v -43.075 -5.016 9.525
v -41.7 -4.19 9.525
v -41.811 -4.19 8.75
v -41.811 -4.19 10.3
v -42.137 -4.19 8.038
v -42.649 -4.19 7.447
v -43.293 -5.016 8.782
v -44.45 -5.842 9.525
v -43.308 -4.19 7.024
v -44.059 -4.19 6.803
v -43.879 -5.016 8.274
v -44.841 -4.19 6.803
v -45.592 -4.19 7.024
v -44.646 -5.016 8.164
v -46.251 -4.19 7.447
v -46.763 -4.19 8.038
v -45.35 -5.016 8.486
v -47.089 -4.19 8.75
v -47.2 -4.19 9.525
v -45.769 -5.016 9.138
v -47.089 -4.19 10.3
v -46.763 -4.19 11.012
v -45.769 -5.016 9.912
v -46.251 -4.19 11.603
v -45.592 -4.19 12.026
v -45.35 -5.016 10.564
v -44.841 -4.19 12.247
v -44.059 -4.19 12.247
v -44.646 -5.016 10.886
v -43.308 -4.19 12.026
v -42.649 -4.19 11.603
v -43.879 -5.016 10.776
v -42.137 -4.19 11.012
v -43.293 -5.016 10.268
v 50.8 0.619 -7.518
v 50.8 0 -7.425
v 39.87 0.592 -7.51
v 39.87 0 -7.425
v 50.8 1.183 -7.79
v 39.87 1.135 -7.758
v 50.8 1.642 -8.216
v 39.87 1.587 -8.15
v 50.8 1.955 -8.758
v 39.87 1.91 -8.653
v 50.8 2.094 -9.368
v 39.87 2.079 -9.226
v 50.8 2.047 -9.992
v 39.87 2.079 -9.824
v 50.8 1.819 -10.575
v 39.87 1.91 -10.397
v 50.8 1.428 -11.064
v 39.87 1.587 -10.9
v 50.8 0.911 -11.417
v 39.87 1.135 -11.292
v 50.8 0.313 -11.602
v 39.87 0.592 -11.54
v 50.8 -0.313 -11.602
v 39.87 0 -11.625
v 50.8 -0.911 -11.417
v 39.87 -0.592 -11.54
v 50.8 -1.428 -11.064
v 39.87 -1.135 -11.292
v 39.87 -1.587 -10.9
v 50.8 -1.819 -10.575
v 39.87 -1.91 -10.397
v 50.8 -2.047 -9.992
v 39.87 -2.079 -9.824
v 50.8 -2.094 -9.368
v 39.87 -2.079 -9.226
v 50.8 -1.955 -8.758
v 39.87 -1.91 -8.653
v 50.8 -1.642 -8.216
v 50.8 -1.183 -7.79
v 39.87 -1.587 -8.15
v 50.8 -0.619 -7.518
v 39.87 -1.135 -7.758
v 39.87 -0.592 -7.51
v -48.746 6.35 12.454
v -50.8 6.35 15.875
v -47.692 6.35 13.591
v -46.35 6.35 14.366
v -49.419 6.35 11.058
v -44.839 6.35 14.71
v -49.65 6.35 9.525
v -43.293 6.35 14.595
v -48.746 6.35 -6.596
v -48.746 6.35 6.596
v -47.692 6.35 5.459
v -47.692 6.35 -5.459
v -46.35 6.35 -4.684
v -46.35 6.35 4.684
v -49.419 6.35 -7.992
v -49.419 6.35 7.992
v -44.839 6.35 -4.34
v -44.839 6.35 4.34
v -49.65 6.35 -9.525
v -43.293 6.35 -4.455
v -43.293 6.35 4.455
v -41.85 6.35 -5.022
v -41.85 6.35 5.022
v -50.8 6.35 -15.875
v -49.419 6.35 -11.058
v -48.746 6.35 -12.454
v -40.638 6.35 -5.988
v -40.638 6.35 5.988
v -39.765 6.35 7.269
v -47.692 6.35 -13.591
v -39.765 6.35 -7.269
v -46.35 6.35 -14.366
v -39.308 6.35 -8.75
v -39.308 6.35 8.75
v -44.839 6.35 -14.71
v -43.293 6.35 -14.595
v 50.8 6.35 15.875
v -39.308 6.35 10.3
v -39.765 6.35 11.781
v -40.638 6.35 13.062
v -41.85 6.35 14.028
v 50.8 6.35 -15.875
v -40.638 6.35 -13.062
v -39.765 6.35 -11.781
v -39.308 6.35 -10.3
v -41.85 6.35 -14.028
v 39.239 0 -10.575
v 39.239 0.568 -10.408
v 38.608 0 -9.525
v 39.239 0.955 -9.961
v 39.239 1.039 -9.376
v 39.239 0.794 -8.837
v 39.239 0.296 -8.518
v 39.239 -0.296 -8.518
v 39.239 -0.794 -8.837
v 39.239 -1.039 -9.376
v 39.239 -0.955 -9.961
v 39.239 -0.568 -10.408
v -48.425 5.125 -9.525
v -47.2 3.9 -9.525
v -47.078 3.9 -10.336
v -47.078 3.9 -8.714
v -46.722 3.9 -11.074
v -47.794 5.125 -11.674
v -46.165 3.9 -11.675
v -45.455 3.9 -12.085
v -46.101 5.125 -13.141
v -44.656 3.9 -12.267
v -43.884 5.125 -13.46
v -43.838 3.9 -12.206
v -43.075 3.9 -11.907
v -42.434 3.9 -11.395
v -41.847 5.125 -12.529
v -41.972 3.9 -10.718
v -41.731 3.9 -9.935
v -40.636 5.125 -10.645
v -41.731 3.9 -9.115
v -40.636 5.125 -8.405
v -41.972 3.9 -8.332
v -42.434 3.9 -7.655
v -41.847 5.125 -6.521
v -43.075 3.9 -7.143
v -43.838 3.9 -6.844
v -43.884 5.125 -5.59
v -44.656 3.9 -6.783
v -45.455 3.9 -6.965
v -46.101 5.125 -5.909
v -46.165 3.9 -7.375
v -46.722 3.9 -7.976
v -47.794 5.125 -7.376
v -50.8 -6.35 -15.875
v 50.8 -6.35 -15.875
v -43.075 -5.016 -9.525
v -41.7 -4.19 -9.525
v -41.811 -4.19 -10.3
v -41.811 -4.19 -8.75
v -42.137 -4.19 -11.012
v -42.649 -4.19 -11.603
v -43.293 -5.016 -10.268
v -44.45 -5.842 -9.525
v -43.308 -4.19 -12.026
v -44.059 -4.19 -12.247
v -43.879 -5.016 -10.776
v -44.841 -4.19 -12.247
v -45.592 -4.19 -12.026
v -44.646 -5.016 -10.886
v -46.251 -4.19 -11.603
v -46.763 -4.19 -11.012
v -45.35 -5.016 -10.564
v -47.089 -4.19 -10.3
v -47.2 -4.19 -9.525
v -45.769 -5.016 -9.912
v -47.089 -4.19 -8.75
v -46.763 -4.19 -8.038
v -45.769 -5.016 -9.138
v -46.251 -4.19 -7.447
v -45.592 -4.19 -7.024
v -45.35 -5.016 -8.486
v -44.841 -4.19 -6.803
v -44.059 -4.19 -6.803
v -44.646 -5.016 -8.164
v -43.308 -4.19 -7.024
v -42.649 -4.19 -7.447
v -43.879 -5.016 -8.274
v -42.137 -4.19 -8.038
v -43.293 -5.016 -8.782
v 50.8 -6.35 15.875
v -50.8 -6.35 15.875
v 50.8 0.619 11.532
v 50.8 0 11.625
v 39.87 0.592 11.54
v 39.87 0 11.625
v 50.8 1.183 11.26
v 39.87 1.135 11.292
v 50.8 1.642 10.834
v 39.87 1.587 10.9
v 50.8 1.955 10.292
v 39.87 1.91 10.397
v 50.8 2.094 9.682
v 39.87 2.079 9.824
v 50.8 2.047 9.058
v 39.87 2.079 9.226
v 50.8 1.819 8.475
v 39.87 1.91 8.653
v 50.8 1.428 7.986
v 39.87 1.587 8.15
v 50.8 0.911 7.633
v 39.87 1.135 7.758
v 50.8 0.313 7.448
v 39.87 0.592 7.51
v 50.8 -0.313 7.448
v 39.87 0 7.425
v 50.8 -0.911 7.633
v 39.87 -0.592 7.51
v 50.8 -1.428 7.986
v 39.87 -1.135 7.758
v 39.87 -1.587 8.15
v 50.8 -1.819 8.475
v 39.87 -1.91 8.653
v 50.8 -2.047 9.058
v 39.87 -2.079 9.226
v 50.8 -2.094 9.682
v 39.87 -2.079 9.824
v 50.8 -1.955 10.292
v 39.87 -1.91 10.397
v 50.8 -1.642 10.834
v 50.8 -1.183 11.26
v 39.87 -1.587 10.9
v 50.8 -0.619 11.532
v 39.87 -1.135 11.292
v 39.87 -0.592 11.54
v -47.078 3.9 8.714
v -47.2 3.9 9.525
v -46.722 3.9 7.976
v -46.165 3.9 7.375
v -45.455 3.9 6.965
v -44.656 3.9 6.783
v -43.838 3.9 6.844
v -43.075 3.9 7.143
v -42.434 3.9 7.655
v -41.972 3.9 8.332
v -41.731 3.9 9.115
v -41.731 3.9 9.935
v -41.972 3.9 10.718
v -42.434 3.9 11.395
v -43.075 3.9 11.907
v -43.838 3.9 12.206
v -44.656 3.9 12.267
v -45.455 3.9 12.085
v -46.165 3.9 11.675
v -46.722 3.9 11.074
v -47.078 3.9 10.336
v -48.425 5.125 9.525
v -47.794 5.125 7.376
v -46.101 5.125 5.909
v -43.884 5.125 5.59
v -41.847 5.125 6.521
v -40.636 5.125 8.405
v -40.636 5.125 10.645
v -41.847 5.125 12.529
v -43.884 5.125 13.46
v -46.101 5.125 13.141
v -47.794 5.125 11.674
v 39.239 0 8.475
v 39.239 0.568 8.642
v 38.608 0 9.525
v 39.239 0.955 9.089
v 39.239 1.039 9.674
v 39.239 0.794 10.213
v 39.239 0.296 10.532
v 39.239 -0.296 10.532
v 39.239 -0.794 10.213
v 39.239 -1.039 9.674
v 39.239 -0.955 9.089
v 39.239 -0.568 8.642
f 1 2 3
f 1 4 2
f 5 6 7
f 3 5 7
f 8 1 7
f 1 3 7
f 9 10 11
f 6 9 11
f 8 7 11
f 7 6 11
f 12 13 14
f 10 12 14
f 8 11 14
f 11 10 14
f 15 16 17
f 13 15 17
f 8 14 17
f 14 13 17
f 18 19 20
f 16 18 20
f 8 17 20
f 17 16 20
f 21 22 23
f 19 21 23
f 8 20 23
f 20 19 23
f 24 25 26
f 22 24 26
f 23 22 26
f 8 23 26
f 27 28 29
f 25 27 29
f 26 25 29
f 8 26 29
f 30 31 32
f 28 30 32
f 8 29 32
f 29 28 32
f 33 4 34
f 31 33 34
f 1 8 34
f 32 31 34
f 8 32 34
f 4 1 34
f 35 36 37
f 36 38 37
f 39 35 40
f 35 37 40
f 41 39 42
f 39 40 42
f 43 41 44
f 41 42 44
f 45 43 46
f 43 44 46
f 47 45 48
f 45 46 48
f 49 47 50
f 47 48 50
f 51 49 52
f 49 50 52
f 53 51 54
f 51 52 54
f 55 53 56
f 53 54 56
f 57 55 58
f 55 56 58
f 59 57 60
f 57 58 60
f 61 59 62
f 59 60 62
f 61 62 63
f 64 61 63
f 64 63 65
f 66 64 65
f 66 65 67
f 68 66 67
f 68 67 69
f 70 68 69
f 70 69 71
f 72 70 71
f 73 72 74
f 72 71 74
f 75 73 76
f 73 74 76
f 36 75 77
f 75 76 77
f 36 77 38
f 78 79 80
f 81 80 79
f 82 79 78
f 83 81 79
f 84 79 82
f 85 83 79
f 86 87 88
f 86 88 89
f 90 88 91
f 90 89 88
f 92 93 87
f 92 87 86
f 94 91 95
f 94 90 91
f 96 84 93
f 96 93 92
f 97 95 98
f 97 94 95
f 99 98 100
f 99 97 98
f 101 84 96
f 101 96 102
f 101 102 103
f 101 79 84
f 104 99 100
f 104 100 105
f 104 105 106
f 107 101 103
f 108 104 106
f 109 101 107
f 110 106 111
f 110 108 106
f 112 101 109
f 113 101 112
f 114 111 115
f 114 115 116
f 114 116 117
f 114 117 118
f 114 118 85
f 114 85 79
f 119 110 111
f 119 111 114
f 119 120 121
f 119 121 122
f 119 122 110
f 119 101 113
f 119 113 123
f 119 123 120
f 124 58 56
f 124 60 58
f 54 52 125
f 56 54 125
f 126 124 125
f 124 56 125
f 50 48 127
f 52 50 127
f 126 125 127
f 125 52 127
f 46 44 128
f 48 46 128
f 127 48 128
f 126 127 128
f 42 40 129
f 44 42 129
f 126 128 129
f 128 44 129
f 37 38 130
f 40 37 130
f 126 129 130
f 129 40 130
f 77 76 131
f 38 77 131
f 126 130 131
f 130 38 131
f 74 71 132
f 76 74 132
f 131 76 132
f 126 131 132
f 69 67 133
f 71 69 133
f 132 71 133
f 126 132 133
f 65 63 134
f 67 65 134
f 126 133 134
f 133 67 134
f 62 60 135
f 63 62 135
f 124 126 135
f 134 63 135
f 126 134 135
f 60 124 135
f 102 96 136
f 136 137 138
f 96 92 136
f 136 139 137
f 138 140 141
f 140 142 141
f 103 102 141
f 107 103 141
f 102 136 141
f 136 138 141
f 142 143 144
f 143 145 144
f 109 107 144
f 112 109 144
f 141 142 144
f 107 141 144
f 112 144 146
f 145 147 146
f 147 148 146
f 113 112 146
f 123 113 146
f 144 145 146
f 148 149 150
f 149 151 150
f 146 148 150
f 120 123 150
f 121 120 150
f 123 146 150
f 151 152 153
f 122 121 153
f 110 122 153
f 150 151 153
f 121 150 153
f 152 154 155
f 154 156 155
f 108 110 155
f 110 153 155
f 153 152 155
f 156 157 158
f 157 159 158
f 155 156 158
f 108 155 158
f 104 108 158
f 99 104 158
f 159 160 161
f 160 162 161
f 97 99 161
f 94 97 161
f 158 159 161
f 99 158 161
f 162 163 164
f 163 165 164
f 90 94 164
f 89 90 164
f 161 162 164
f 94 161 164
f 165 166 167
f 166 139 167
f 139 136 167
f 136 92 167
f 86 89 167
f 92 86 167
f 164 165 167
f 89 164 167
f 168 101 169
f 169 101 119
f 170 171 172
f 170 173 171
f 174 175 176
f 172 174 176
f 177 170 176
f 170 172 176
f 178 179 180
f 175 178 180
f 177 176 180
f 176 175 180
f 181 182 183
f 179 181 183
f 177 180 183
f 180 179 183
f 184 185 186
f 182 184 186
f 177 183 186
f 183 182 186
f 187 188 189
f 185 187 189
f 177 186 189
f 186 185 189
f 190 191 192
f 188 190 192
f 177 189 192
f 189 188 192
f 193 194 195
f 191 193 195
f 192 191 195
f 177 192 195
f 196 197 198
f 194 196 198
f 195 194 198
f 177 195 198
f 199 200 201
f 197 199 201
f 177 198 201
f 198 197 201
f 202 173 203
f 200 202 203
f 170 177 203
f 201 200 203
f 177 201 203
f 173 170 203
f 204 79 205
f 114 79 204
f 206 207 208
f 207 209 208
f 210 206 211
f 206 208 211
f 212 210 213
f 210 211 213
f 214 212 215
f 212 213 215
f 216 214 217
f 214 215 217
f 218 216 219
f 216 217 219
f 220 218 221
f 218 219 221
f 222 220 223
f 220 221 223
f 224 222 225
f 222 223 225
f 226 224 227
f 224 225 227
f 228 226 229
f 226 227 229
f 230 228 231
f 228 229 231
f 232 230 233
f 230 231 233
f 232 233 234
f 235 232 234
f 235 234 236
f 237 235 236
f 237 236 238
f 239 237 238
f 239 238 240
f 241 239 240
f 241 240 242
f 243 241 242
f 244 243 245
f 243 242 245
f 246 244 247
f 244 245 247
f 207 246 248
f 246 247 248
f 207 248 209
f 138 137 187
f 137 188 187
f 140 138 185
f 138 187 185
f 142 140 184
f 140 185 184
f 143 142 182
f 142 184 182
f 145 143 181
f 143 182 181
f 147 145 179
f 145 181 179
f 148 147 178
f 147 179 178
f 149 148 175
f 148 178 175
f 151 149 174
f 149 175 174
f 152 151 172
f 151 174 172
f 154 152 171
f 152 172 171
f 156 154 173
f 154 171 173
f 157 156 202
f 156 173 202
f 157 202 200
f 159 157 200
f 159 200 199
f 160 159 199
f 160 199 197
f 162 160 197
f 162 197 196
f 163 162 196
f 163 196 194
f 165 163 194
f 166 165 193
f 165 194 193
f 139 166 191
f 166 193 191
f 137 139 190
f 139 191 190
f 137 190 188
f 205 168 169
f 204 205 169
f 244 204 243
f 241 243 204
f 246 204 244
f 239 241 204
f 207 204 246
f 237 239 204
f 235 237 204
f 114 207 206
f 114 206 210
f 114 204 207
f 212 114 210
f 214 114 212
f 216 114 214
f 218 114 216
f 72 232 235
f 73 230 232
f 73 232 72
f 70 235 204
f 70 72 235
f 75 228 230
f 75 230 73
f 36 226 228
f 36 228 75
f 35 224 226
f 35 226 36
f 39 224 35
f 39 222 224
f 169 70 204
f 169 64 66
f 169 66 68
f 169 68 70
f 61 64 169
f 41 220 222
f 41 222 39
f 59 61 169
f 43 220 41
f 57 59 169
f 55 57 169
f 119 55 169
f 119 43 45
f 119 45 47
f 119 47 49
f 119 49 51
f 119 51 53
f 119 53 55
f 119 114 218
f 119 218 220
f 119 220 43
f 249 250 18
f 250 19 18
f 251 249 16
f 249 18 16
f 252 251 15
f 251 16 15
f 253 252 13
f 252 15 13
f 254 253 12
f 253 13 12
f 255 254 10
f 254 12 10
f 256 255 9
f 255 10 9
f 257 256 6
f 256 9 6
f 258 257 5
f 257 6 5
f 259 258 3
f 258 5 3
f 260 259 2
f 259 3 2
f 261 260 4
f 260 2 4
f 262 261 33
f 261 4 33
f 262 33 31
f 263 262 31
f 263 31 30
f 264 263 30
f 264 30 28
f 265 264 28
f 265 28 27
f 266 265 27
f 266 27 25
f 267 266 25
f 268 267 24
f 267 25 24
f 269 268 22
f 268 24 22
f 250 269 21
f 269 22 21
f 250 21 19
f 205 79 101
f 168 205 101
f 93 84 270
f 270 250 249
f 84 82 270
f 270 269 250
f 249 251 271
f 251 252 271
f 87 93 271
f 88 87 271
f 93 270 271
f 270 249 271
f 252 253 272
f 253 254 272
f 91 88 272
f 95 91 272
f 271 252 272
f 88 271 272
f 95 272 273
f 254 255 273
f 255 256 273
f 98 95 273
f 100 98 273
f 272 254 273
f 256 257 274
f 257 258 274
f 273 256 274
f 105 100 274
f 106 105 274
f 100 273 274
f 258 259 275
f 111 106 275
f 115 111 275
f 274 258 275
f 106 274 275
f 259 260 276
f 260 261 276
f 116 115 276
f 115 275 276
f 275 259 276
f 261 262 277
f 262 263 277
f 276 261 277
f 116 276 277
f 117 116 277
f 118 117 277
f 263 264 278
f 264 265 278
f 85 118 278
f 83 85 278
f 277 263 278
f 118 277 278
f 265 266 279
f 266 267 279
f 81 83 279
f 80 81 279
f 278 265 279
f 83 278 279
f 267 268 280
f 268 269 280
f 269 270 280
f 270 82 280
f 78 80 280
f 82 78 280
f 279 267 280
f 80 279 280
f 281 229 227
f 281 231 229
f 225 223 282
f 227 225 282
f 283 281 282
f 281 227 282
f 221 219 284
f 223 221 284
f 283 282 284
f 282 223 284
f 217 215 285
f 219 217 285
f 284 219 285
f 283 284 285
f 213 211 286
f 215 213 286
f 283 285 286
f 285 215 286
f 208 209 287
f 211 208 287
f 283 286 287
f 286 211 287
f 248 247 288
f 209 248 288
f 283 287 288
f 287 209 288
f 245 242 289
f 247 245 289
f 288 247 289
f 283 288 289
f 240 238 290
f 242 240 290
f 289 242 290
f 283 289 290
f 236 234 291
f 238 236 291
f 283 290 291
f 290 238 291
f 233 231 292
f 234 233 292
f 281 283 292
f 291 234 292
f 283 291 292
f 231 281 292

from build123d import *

# Parameters (mm, degrees)
SKETCH1_W                                       = 101.6
SKETCH1_H                                       = 31.75
BOSS_EXTRUDE1_DEPTH                             = 6.35
M5X0_8_TAPPED_HOLE1_D                           = 4.2
M5X0_8_TAPPED_HOLE1_DEPTH                       = 10.9301927
M5X0_8_TAPPED_HOLE1_TIP                         = 1.2618073
CSK_FOR_M5_FLAT_HEAD_MACHINE_SCREW1_D           = 5.5
CSK_FOR_M5_FLAT_HEAD_MACHINE_SCREW1_DEPTH       = 10.539633298
CSK_FOR_M5_FLAT_HEAD_MACHINE_SCREW1_CSINK_D     = 10.4
CSK_FOR_M5_FLAT_HEAD_MACHINE_SCREW1_CSINK_ANGLE = 90
CSK_FOR_M5_FLAT_HEAD_MACHINE_SCREW1_TIP         = 1.652366702


with BuildPart() as part:
    # Sketch1 → Boss-Extrude1 (new, symmetric)
    with BuildSketch(Plane(origin=(0, 0, 0), x_dir=(1, 0, 0), z_dir=(0, 1, 0))):
        Rectangle(SKETCH1_W, SKETCH1_H)
    extrude(amount=BOSS_EXTRUDE1_DEPTH, both=True)

    # M5x0.8 Tapped Hole1
    with Locations(Plane(origin=(50.8, 0, 0), x_dir=(0, 0, -1), z_dir=(1, 0, 0))):
        with Locations((-9.525, 0), (9.525, 0)):
            Hole(M5X0_8_TAPPED_HOLE1_D / 2, depth=M5X0_8_TAPPED_HOLE1_DEPTH)
            with Locations((0, 0, -(M5X0_8_TAPPED_HOLE1_DEPTH + M5X0_8_TAPPED_HOLE1_TIP / 2))):  # 118° drill point
                Cone(0, M5X0_8_TAPPED_HOLE1_D / 2, M5X0_8_TAPPED_HOLE1_TIP, mode=Mode.SUBTRACT)

    # CSK for M5 Flat Head Machine Screw1
    with Locations(Plane(origin=(0, 6.35, 0), x_dir=(1, 0, 0), z_dir=(0, 1, 0))):
        with Locations((-44.45, -9.525), (-44.45, 9.525)):
            CounterSinkHole(CSK_FOR_M5_FLAT_HEAD_MACHINE_SCREW1_D / 2, CSK_FOR_M5_FLAT_HEAD_MACHINE_SCREW1_CSINK_D / 2, depth=CSK_FOR_M5_FLAT_HEAD_MACHINE_SCREW1_DEPTH, counter_sink_angle=CSK_FOR_M5_FLAT_HEAD_MACHINE_SCREW1_CSINK_ANGLE)
            with Locations((0, 0, -(CSK_FOR_M5_FLAT_HEAD_MACHINE_SCREW1_DEPTH + CSK_FOR_M5_FLAT_HEAD_MACHINE_SCREW1_TIP / 2))):  # 118° drill point
                Cone(0, CSK_FOR_M5_FLAT_HEAD_MACHINE_SCREW1_D / 2, CSK_FOR_M5_FLAT_HEAD_MACHINE_SCREW1_TIP, mode=Mode.SUBTRACT)


solid = part.part
